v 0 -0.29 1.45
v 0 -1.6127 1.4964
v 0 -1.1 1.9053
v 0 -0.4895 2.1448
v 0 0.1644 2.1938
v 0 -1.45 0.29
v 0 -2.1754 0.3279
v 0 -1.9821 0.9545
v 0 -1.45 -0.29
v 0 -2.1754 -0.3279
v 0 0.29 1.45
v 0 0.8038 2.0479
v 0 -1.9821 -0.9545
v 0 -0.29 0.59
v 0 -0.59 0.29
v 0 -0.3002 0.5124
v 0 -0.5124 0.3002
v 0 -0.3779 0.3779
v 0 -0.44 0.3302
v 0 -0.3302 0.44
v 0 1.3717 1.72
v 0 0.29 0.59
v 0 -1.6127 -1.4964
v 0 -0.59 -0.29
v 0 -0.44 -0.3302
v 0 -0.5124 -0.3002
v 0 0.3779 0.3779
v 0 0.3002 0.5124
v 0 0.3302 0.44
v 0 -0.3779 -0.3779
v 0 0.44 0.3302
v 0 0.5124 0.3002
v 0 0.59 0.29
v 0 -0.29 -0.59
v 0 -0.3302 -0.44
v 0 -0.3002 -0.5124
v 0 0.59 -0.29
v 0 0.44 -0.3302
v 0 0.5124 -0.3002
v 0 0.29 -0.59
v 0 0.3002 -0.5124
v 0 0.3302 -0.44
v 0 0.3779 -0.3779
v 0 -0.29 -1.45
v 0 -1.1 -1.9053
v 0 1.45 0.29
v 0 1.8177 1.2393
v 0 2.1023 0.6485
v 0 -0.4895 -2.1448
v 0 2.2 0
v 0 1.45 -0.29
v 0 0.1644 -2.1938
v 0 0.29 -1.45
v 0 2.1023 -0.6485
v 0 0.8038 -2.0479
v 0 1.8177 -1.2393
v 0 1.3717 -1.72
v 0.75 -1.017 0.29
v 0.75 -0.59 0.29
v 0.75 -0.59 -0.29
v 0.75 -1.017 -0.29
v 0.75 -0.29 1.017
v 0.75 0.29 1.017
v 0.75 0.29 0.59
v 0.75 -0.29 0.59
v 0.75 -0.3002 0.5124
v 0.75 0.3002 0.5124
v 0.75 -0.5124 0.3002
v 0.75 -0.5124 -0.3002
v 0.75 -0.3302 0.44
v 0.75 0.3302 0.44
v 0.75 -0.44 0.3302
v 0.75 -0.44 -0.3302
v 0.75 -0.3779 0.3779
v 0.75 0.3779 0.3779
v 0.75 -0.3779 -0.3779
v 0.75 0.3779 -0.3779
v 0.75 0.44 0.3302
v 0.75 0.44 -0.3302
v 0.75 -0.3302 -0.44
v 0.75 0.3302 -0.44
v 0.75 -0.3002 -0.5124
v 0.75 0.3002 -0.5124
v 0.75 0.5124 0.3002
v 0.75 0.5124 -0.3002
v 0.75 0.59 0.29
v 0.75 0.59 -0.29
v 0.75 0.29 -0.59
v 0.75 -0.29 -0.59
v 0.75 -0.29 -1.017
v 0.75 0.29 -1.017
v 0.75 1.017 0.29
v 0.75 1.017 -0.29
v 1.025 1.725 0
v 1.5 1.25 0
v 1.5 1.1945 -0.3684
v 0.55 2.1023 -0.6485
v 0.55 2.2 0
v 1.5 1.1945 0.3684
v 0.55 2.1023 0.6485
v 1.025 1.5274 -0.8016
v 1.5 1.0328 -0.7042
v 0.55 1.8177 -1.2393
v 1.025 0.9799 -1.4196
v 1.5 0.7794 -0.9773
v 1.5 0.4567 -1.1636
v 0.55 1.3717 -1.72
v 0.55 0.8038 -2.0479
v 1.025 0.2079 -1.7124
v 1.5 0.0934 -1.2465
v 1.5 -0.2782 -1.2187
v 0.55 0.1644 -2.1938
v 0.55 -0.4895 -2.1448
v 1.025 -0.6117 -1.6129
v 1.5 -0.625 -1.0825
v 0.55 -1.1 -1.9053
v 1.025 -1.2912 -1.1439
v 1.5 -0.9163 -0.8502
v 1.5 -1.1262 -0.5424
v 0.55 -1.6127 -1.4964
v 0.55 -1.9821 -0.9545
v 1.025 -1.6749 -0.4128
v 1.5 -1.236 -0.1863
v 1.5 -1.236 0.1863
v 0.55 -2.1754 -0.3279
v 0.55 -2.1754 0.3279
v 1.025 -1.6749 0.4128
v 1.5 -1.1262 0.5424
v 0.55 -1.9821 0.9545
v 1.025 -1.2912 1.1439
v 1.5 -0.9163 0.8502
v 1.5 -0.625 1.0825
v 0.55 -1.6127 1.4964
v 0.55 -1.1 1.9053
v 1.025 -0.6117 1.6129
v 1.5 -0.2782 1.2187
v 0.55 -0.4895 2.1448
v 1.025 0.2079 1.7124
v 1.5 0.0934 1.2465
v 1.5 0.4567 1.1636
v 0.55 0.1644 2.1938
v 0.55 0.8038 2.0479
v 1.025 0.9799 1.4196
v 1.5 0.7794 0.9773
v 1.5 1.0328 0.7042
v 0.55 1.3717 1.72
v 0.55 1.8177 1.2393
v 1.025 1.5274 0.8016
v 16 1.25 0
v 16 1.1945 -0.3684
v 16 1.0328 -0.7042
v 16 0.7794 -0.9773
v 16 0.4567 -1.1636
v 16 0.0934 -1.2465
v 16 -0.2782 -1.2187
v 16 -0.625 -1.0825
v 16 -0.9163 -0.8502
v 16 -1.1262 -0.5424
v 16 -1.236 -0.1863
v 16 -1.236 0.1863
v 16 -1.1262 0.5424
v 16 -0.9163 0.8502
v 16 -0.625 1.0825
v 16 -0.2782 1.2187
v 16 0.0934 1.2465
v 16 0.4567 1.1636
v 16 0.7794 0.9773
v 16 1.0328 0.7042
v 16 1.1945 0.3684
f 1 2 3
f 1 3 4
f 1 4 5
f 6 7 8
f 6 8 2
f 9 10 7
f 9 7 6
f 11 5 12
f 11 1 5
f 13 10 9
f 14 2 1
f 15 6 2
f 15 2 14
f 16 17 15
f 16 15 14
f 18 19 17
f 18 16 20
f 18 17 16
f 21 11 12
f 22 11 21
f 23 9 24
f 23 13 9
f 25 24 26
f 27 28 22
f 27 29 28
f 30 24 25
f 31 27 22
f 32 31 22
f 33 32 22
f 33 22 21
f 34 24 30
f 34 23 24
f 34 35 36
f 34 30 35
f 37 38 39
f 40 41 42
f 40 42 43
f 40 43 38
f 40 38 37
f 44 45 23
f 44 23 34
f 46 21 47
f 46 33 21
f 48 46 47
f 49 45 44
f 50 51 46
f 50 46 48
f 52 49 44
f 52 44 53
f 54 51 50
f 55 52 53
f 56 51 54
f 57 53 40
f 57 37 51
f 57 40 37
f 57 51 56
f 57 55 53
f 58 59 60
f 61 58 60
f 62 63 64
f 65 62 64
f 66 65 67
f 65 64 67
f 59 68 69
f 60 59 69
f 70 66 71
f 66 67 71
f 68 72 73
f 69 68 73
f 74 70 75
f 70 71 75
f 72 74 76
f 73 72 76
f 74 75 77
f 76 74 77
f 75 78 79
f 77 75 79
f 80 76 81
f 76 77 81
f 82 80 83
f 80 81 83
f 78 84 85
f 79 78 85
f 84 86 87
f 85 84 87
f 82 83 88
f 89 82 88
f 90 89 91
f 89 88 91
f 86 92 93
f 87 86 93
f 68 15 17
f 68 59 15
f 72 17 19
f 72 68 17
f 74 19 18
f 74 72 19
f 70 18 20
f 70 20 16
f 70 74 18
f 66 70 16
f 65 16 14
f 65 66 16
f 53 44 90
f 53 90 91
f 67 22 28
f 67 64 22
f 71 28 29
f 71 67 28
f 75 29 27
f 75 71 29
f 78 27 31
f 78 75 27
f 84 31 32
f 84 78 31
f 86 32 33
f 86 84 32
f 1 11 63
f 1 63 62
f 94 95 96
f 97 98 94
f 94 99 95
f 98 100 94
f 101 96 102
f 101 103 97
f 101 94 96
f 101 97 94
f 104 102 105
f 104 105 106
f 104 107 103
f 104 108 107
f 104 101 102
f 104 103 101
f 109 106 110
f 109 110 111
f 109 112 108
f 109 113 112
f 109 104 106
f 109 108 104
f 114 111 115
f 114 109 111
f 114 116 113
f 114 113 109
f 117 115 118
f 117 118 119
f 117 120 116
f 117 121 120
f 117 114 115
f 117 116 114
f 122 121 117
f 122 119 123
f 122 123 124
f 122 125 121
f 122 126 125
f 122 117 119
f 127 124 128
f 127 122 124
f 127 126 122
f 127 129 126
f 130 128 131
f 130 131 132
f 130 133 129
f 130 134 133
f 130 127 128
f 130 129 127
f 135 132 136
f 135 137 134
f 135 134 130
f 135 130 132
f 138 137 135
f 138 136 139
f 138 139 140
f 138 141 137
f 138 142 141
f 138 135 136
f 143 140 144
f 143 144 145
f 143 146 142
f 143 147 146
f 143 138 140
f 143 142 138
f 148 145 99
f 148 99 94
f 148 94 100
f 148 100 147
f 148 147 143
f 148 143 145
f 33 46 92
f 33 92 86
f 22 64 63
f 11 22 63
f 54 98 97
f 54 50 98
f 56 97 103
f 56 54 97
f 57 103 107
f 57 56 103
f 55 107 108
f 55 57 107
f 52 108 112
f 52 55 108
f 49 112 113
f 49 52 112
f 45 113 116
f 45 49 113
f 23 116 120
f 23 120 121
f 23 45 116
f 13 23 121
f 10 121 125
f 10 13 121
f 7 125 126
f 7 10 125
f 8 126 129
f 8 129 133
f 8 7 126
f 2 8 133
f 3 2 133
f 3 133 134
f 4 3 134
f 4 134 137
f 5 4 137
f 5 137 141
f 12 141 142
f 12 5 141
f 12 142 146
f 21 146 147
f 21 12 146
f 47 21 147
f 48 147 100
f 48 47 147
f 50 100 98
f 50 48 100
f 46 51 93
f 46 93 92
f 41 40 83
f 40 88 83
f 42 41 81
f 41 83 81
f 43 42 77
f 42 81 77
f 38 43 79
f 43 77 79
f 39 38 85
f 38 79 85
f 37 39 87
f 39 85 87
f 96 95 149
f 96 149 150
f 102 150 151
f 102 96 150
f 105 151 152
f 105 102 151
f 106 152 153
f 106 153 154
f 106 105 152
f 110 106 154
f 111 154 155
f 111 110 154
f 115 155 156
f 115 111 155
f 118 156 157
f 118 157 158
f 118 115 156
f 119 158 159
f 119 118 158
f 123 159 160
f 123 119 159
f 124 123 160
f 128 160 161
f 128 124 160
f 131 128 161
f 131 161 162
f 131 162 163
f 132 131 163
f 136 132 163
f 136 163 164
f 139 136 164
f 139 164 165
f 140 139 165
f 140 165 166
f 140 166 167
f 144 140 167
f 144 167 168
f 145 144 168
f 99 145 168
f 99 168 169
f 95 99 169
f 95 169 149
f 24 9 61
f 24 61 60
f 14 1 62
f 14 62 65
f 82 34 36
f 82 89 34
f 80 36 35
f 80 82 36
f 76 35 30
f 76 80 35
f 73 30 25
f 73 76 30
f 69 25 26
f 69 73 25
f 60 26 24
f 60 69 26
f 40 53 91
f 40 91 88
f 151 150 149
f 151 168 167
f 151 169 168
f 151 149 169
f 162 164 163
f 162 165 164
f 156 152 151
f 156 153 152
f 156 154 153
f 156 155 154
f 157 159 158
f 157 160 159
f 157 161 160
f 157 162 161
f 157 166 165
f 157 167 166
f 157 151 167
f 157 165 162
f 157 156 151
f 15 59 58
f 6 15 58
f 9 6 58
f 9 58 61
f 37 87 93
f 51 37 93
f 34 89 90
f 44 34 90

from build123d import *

# Parameters (mm, degrees)
CROSSRECESS_DEPTH = 0.75
DRAFT9_ANGLE      = 30
FILLET5_R         = 0.3
SKETCH10_W        = 0.45
SKETCH10_H        = 1.25


with BuildPart() as part:
    # Sketch1 → Base (revolve)
    with BuildSketch(Plane.XY):
        Polygon((16, 1.25), (2.4, 1.25), (1.5, 1.25), (0.55, 2.2), (0, 2.2), (0, 0), (16, 0), align=None)
    revolve(axis=Axis((4.515812911, 0, 0), (-1, 0, 0)))

    # Sketch6 → CrossRecess (cut)
    with BuildSketch(Plane(origin=(0, 0, 0), x_dir=(0, 0, -1), z_dir=(1, 0, 0))):
        Polygon((0.29, 0.29), (0.29, 1.45), (-0.29, 1.45), (-0.29, 0.29), (-1.45, 0.29), (-1.45, -0.29), (-0.29, -0.29), (-0.29, -1.45), (0.29, -1.45), (0.29, -0.29), (1.45, -0.29), (1.45, 0.29), align=None)
    extrude(amount=CROSSRECESS_DEPTH, mode=Mode.SUBTRACT)

    # Draft9
    draft9_faces = [part.faces().sort_by_distance(p)[0] for p in [
        (0.375, -1.45, 0),
        (0.375, 0, 1.45),
        (0.375, 0, -1.45),
        (0.375, 1.45, 0),
    ]]
    draft(draft9_faces, Plane(origin=(0, 2.2, 0), x_dir=(0, 0, -1), z_dir=(-1, 0, 0)), DRAFT9_ANGLE)

    # Fillet5
    fillet5_edges = [part.edges().sort_by_distance(p)[0] for p in [
        (0.375, 0.29, 0.29),
        (0.375, -0.29, 0.29),
        (0.375, -0.29, -0.29),
        (0.375, 0.29, -0.29),
    ]]
    fillet(fillet5_edges, radius=FILLET5_R)

    # Sketch10 → Revolve2 (revolve)
    with BuildSketch(Plane.XY):
        with Locations((1.725, 0.625)):
            Rectangle(SKETCH10_W, SKETCH10_H)
    revolve(axis=Axis((62.228915663, 0, 0), (-1, 0, 0)))


solid = part.part
